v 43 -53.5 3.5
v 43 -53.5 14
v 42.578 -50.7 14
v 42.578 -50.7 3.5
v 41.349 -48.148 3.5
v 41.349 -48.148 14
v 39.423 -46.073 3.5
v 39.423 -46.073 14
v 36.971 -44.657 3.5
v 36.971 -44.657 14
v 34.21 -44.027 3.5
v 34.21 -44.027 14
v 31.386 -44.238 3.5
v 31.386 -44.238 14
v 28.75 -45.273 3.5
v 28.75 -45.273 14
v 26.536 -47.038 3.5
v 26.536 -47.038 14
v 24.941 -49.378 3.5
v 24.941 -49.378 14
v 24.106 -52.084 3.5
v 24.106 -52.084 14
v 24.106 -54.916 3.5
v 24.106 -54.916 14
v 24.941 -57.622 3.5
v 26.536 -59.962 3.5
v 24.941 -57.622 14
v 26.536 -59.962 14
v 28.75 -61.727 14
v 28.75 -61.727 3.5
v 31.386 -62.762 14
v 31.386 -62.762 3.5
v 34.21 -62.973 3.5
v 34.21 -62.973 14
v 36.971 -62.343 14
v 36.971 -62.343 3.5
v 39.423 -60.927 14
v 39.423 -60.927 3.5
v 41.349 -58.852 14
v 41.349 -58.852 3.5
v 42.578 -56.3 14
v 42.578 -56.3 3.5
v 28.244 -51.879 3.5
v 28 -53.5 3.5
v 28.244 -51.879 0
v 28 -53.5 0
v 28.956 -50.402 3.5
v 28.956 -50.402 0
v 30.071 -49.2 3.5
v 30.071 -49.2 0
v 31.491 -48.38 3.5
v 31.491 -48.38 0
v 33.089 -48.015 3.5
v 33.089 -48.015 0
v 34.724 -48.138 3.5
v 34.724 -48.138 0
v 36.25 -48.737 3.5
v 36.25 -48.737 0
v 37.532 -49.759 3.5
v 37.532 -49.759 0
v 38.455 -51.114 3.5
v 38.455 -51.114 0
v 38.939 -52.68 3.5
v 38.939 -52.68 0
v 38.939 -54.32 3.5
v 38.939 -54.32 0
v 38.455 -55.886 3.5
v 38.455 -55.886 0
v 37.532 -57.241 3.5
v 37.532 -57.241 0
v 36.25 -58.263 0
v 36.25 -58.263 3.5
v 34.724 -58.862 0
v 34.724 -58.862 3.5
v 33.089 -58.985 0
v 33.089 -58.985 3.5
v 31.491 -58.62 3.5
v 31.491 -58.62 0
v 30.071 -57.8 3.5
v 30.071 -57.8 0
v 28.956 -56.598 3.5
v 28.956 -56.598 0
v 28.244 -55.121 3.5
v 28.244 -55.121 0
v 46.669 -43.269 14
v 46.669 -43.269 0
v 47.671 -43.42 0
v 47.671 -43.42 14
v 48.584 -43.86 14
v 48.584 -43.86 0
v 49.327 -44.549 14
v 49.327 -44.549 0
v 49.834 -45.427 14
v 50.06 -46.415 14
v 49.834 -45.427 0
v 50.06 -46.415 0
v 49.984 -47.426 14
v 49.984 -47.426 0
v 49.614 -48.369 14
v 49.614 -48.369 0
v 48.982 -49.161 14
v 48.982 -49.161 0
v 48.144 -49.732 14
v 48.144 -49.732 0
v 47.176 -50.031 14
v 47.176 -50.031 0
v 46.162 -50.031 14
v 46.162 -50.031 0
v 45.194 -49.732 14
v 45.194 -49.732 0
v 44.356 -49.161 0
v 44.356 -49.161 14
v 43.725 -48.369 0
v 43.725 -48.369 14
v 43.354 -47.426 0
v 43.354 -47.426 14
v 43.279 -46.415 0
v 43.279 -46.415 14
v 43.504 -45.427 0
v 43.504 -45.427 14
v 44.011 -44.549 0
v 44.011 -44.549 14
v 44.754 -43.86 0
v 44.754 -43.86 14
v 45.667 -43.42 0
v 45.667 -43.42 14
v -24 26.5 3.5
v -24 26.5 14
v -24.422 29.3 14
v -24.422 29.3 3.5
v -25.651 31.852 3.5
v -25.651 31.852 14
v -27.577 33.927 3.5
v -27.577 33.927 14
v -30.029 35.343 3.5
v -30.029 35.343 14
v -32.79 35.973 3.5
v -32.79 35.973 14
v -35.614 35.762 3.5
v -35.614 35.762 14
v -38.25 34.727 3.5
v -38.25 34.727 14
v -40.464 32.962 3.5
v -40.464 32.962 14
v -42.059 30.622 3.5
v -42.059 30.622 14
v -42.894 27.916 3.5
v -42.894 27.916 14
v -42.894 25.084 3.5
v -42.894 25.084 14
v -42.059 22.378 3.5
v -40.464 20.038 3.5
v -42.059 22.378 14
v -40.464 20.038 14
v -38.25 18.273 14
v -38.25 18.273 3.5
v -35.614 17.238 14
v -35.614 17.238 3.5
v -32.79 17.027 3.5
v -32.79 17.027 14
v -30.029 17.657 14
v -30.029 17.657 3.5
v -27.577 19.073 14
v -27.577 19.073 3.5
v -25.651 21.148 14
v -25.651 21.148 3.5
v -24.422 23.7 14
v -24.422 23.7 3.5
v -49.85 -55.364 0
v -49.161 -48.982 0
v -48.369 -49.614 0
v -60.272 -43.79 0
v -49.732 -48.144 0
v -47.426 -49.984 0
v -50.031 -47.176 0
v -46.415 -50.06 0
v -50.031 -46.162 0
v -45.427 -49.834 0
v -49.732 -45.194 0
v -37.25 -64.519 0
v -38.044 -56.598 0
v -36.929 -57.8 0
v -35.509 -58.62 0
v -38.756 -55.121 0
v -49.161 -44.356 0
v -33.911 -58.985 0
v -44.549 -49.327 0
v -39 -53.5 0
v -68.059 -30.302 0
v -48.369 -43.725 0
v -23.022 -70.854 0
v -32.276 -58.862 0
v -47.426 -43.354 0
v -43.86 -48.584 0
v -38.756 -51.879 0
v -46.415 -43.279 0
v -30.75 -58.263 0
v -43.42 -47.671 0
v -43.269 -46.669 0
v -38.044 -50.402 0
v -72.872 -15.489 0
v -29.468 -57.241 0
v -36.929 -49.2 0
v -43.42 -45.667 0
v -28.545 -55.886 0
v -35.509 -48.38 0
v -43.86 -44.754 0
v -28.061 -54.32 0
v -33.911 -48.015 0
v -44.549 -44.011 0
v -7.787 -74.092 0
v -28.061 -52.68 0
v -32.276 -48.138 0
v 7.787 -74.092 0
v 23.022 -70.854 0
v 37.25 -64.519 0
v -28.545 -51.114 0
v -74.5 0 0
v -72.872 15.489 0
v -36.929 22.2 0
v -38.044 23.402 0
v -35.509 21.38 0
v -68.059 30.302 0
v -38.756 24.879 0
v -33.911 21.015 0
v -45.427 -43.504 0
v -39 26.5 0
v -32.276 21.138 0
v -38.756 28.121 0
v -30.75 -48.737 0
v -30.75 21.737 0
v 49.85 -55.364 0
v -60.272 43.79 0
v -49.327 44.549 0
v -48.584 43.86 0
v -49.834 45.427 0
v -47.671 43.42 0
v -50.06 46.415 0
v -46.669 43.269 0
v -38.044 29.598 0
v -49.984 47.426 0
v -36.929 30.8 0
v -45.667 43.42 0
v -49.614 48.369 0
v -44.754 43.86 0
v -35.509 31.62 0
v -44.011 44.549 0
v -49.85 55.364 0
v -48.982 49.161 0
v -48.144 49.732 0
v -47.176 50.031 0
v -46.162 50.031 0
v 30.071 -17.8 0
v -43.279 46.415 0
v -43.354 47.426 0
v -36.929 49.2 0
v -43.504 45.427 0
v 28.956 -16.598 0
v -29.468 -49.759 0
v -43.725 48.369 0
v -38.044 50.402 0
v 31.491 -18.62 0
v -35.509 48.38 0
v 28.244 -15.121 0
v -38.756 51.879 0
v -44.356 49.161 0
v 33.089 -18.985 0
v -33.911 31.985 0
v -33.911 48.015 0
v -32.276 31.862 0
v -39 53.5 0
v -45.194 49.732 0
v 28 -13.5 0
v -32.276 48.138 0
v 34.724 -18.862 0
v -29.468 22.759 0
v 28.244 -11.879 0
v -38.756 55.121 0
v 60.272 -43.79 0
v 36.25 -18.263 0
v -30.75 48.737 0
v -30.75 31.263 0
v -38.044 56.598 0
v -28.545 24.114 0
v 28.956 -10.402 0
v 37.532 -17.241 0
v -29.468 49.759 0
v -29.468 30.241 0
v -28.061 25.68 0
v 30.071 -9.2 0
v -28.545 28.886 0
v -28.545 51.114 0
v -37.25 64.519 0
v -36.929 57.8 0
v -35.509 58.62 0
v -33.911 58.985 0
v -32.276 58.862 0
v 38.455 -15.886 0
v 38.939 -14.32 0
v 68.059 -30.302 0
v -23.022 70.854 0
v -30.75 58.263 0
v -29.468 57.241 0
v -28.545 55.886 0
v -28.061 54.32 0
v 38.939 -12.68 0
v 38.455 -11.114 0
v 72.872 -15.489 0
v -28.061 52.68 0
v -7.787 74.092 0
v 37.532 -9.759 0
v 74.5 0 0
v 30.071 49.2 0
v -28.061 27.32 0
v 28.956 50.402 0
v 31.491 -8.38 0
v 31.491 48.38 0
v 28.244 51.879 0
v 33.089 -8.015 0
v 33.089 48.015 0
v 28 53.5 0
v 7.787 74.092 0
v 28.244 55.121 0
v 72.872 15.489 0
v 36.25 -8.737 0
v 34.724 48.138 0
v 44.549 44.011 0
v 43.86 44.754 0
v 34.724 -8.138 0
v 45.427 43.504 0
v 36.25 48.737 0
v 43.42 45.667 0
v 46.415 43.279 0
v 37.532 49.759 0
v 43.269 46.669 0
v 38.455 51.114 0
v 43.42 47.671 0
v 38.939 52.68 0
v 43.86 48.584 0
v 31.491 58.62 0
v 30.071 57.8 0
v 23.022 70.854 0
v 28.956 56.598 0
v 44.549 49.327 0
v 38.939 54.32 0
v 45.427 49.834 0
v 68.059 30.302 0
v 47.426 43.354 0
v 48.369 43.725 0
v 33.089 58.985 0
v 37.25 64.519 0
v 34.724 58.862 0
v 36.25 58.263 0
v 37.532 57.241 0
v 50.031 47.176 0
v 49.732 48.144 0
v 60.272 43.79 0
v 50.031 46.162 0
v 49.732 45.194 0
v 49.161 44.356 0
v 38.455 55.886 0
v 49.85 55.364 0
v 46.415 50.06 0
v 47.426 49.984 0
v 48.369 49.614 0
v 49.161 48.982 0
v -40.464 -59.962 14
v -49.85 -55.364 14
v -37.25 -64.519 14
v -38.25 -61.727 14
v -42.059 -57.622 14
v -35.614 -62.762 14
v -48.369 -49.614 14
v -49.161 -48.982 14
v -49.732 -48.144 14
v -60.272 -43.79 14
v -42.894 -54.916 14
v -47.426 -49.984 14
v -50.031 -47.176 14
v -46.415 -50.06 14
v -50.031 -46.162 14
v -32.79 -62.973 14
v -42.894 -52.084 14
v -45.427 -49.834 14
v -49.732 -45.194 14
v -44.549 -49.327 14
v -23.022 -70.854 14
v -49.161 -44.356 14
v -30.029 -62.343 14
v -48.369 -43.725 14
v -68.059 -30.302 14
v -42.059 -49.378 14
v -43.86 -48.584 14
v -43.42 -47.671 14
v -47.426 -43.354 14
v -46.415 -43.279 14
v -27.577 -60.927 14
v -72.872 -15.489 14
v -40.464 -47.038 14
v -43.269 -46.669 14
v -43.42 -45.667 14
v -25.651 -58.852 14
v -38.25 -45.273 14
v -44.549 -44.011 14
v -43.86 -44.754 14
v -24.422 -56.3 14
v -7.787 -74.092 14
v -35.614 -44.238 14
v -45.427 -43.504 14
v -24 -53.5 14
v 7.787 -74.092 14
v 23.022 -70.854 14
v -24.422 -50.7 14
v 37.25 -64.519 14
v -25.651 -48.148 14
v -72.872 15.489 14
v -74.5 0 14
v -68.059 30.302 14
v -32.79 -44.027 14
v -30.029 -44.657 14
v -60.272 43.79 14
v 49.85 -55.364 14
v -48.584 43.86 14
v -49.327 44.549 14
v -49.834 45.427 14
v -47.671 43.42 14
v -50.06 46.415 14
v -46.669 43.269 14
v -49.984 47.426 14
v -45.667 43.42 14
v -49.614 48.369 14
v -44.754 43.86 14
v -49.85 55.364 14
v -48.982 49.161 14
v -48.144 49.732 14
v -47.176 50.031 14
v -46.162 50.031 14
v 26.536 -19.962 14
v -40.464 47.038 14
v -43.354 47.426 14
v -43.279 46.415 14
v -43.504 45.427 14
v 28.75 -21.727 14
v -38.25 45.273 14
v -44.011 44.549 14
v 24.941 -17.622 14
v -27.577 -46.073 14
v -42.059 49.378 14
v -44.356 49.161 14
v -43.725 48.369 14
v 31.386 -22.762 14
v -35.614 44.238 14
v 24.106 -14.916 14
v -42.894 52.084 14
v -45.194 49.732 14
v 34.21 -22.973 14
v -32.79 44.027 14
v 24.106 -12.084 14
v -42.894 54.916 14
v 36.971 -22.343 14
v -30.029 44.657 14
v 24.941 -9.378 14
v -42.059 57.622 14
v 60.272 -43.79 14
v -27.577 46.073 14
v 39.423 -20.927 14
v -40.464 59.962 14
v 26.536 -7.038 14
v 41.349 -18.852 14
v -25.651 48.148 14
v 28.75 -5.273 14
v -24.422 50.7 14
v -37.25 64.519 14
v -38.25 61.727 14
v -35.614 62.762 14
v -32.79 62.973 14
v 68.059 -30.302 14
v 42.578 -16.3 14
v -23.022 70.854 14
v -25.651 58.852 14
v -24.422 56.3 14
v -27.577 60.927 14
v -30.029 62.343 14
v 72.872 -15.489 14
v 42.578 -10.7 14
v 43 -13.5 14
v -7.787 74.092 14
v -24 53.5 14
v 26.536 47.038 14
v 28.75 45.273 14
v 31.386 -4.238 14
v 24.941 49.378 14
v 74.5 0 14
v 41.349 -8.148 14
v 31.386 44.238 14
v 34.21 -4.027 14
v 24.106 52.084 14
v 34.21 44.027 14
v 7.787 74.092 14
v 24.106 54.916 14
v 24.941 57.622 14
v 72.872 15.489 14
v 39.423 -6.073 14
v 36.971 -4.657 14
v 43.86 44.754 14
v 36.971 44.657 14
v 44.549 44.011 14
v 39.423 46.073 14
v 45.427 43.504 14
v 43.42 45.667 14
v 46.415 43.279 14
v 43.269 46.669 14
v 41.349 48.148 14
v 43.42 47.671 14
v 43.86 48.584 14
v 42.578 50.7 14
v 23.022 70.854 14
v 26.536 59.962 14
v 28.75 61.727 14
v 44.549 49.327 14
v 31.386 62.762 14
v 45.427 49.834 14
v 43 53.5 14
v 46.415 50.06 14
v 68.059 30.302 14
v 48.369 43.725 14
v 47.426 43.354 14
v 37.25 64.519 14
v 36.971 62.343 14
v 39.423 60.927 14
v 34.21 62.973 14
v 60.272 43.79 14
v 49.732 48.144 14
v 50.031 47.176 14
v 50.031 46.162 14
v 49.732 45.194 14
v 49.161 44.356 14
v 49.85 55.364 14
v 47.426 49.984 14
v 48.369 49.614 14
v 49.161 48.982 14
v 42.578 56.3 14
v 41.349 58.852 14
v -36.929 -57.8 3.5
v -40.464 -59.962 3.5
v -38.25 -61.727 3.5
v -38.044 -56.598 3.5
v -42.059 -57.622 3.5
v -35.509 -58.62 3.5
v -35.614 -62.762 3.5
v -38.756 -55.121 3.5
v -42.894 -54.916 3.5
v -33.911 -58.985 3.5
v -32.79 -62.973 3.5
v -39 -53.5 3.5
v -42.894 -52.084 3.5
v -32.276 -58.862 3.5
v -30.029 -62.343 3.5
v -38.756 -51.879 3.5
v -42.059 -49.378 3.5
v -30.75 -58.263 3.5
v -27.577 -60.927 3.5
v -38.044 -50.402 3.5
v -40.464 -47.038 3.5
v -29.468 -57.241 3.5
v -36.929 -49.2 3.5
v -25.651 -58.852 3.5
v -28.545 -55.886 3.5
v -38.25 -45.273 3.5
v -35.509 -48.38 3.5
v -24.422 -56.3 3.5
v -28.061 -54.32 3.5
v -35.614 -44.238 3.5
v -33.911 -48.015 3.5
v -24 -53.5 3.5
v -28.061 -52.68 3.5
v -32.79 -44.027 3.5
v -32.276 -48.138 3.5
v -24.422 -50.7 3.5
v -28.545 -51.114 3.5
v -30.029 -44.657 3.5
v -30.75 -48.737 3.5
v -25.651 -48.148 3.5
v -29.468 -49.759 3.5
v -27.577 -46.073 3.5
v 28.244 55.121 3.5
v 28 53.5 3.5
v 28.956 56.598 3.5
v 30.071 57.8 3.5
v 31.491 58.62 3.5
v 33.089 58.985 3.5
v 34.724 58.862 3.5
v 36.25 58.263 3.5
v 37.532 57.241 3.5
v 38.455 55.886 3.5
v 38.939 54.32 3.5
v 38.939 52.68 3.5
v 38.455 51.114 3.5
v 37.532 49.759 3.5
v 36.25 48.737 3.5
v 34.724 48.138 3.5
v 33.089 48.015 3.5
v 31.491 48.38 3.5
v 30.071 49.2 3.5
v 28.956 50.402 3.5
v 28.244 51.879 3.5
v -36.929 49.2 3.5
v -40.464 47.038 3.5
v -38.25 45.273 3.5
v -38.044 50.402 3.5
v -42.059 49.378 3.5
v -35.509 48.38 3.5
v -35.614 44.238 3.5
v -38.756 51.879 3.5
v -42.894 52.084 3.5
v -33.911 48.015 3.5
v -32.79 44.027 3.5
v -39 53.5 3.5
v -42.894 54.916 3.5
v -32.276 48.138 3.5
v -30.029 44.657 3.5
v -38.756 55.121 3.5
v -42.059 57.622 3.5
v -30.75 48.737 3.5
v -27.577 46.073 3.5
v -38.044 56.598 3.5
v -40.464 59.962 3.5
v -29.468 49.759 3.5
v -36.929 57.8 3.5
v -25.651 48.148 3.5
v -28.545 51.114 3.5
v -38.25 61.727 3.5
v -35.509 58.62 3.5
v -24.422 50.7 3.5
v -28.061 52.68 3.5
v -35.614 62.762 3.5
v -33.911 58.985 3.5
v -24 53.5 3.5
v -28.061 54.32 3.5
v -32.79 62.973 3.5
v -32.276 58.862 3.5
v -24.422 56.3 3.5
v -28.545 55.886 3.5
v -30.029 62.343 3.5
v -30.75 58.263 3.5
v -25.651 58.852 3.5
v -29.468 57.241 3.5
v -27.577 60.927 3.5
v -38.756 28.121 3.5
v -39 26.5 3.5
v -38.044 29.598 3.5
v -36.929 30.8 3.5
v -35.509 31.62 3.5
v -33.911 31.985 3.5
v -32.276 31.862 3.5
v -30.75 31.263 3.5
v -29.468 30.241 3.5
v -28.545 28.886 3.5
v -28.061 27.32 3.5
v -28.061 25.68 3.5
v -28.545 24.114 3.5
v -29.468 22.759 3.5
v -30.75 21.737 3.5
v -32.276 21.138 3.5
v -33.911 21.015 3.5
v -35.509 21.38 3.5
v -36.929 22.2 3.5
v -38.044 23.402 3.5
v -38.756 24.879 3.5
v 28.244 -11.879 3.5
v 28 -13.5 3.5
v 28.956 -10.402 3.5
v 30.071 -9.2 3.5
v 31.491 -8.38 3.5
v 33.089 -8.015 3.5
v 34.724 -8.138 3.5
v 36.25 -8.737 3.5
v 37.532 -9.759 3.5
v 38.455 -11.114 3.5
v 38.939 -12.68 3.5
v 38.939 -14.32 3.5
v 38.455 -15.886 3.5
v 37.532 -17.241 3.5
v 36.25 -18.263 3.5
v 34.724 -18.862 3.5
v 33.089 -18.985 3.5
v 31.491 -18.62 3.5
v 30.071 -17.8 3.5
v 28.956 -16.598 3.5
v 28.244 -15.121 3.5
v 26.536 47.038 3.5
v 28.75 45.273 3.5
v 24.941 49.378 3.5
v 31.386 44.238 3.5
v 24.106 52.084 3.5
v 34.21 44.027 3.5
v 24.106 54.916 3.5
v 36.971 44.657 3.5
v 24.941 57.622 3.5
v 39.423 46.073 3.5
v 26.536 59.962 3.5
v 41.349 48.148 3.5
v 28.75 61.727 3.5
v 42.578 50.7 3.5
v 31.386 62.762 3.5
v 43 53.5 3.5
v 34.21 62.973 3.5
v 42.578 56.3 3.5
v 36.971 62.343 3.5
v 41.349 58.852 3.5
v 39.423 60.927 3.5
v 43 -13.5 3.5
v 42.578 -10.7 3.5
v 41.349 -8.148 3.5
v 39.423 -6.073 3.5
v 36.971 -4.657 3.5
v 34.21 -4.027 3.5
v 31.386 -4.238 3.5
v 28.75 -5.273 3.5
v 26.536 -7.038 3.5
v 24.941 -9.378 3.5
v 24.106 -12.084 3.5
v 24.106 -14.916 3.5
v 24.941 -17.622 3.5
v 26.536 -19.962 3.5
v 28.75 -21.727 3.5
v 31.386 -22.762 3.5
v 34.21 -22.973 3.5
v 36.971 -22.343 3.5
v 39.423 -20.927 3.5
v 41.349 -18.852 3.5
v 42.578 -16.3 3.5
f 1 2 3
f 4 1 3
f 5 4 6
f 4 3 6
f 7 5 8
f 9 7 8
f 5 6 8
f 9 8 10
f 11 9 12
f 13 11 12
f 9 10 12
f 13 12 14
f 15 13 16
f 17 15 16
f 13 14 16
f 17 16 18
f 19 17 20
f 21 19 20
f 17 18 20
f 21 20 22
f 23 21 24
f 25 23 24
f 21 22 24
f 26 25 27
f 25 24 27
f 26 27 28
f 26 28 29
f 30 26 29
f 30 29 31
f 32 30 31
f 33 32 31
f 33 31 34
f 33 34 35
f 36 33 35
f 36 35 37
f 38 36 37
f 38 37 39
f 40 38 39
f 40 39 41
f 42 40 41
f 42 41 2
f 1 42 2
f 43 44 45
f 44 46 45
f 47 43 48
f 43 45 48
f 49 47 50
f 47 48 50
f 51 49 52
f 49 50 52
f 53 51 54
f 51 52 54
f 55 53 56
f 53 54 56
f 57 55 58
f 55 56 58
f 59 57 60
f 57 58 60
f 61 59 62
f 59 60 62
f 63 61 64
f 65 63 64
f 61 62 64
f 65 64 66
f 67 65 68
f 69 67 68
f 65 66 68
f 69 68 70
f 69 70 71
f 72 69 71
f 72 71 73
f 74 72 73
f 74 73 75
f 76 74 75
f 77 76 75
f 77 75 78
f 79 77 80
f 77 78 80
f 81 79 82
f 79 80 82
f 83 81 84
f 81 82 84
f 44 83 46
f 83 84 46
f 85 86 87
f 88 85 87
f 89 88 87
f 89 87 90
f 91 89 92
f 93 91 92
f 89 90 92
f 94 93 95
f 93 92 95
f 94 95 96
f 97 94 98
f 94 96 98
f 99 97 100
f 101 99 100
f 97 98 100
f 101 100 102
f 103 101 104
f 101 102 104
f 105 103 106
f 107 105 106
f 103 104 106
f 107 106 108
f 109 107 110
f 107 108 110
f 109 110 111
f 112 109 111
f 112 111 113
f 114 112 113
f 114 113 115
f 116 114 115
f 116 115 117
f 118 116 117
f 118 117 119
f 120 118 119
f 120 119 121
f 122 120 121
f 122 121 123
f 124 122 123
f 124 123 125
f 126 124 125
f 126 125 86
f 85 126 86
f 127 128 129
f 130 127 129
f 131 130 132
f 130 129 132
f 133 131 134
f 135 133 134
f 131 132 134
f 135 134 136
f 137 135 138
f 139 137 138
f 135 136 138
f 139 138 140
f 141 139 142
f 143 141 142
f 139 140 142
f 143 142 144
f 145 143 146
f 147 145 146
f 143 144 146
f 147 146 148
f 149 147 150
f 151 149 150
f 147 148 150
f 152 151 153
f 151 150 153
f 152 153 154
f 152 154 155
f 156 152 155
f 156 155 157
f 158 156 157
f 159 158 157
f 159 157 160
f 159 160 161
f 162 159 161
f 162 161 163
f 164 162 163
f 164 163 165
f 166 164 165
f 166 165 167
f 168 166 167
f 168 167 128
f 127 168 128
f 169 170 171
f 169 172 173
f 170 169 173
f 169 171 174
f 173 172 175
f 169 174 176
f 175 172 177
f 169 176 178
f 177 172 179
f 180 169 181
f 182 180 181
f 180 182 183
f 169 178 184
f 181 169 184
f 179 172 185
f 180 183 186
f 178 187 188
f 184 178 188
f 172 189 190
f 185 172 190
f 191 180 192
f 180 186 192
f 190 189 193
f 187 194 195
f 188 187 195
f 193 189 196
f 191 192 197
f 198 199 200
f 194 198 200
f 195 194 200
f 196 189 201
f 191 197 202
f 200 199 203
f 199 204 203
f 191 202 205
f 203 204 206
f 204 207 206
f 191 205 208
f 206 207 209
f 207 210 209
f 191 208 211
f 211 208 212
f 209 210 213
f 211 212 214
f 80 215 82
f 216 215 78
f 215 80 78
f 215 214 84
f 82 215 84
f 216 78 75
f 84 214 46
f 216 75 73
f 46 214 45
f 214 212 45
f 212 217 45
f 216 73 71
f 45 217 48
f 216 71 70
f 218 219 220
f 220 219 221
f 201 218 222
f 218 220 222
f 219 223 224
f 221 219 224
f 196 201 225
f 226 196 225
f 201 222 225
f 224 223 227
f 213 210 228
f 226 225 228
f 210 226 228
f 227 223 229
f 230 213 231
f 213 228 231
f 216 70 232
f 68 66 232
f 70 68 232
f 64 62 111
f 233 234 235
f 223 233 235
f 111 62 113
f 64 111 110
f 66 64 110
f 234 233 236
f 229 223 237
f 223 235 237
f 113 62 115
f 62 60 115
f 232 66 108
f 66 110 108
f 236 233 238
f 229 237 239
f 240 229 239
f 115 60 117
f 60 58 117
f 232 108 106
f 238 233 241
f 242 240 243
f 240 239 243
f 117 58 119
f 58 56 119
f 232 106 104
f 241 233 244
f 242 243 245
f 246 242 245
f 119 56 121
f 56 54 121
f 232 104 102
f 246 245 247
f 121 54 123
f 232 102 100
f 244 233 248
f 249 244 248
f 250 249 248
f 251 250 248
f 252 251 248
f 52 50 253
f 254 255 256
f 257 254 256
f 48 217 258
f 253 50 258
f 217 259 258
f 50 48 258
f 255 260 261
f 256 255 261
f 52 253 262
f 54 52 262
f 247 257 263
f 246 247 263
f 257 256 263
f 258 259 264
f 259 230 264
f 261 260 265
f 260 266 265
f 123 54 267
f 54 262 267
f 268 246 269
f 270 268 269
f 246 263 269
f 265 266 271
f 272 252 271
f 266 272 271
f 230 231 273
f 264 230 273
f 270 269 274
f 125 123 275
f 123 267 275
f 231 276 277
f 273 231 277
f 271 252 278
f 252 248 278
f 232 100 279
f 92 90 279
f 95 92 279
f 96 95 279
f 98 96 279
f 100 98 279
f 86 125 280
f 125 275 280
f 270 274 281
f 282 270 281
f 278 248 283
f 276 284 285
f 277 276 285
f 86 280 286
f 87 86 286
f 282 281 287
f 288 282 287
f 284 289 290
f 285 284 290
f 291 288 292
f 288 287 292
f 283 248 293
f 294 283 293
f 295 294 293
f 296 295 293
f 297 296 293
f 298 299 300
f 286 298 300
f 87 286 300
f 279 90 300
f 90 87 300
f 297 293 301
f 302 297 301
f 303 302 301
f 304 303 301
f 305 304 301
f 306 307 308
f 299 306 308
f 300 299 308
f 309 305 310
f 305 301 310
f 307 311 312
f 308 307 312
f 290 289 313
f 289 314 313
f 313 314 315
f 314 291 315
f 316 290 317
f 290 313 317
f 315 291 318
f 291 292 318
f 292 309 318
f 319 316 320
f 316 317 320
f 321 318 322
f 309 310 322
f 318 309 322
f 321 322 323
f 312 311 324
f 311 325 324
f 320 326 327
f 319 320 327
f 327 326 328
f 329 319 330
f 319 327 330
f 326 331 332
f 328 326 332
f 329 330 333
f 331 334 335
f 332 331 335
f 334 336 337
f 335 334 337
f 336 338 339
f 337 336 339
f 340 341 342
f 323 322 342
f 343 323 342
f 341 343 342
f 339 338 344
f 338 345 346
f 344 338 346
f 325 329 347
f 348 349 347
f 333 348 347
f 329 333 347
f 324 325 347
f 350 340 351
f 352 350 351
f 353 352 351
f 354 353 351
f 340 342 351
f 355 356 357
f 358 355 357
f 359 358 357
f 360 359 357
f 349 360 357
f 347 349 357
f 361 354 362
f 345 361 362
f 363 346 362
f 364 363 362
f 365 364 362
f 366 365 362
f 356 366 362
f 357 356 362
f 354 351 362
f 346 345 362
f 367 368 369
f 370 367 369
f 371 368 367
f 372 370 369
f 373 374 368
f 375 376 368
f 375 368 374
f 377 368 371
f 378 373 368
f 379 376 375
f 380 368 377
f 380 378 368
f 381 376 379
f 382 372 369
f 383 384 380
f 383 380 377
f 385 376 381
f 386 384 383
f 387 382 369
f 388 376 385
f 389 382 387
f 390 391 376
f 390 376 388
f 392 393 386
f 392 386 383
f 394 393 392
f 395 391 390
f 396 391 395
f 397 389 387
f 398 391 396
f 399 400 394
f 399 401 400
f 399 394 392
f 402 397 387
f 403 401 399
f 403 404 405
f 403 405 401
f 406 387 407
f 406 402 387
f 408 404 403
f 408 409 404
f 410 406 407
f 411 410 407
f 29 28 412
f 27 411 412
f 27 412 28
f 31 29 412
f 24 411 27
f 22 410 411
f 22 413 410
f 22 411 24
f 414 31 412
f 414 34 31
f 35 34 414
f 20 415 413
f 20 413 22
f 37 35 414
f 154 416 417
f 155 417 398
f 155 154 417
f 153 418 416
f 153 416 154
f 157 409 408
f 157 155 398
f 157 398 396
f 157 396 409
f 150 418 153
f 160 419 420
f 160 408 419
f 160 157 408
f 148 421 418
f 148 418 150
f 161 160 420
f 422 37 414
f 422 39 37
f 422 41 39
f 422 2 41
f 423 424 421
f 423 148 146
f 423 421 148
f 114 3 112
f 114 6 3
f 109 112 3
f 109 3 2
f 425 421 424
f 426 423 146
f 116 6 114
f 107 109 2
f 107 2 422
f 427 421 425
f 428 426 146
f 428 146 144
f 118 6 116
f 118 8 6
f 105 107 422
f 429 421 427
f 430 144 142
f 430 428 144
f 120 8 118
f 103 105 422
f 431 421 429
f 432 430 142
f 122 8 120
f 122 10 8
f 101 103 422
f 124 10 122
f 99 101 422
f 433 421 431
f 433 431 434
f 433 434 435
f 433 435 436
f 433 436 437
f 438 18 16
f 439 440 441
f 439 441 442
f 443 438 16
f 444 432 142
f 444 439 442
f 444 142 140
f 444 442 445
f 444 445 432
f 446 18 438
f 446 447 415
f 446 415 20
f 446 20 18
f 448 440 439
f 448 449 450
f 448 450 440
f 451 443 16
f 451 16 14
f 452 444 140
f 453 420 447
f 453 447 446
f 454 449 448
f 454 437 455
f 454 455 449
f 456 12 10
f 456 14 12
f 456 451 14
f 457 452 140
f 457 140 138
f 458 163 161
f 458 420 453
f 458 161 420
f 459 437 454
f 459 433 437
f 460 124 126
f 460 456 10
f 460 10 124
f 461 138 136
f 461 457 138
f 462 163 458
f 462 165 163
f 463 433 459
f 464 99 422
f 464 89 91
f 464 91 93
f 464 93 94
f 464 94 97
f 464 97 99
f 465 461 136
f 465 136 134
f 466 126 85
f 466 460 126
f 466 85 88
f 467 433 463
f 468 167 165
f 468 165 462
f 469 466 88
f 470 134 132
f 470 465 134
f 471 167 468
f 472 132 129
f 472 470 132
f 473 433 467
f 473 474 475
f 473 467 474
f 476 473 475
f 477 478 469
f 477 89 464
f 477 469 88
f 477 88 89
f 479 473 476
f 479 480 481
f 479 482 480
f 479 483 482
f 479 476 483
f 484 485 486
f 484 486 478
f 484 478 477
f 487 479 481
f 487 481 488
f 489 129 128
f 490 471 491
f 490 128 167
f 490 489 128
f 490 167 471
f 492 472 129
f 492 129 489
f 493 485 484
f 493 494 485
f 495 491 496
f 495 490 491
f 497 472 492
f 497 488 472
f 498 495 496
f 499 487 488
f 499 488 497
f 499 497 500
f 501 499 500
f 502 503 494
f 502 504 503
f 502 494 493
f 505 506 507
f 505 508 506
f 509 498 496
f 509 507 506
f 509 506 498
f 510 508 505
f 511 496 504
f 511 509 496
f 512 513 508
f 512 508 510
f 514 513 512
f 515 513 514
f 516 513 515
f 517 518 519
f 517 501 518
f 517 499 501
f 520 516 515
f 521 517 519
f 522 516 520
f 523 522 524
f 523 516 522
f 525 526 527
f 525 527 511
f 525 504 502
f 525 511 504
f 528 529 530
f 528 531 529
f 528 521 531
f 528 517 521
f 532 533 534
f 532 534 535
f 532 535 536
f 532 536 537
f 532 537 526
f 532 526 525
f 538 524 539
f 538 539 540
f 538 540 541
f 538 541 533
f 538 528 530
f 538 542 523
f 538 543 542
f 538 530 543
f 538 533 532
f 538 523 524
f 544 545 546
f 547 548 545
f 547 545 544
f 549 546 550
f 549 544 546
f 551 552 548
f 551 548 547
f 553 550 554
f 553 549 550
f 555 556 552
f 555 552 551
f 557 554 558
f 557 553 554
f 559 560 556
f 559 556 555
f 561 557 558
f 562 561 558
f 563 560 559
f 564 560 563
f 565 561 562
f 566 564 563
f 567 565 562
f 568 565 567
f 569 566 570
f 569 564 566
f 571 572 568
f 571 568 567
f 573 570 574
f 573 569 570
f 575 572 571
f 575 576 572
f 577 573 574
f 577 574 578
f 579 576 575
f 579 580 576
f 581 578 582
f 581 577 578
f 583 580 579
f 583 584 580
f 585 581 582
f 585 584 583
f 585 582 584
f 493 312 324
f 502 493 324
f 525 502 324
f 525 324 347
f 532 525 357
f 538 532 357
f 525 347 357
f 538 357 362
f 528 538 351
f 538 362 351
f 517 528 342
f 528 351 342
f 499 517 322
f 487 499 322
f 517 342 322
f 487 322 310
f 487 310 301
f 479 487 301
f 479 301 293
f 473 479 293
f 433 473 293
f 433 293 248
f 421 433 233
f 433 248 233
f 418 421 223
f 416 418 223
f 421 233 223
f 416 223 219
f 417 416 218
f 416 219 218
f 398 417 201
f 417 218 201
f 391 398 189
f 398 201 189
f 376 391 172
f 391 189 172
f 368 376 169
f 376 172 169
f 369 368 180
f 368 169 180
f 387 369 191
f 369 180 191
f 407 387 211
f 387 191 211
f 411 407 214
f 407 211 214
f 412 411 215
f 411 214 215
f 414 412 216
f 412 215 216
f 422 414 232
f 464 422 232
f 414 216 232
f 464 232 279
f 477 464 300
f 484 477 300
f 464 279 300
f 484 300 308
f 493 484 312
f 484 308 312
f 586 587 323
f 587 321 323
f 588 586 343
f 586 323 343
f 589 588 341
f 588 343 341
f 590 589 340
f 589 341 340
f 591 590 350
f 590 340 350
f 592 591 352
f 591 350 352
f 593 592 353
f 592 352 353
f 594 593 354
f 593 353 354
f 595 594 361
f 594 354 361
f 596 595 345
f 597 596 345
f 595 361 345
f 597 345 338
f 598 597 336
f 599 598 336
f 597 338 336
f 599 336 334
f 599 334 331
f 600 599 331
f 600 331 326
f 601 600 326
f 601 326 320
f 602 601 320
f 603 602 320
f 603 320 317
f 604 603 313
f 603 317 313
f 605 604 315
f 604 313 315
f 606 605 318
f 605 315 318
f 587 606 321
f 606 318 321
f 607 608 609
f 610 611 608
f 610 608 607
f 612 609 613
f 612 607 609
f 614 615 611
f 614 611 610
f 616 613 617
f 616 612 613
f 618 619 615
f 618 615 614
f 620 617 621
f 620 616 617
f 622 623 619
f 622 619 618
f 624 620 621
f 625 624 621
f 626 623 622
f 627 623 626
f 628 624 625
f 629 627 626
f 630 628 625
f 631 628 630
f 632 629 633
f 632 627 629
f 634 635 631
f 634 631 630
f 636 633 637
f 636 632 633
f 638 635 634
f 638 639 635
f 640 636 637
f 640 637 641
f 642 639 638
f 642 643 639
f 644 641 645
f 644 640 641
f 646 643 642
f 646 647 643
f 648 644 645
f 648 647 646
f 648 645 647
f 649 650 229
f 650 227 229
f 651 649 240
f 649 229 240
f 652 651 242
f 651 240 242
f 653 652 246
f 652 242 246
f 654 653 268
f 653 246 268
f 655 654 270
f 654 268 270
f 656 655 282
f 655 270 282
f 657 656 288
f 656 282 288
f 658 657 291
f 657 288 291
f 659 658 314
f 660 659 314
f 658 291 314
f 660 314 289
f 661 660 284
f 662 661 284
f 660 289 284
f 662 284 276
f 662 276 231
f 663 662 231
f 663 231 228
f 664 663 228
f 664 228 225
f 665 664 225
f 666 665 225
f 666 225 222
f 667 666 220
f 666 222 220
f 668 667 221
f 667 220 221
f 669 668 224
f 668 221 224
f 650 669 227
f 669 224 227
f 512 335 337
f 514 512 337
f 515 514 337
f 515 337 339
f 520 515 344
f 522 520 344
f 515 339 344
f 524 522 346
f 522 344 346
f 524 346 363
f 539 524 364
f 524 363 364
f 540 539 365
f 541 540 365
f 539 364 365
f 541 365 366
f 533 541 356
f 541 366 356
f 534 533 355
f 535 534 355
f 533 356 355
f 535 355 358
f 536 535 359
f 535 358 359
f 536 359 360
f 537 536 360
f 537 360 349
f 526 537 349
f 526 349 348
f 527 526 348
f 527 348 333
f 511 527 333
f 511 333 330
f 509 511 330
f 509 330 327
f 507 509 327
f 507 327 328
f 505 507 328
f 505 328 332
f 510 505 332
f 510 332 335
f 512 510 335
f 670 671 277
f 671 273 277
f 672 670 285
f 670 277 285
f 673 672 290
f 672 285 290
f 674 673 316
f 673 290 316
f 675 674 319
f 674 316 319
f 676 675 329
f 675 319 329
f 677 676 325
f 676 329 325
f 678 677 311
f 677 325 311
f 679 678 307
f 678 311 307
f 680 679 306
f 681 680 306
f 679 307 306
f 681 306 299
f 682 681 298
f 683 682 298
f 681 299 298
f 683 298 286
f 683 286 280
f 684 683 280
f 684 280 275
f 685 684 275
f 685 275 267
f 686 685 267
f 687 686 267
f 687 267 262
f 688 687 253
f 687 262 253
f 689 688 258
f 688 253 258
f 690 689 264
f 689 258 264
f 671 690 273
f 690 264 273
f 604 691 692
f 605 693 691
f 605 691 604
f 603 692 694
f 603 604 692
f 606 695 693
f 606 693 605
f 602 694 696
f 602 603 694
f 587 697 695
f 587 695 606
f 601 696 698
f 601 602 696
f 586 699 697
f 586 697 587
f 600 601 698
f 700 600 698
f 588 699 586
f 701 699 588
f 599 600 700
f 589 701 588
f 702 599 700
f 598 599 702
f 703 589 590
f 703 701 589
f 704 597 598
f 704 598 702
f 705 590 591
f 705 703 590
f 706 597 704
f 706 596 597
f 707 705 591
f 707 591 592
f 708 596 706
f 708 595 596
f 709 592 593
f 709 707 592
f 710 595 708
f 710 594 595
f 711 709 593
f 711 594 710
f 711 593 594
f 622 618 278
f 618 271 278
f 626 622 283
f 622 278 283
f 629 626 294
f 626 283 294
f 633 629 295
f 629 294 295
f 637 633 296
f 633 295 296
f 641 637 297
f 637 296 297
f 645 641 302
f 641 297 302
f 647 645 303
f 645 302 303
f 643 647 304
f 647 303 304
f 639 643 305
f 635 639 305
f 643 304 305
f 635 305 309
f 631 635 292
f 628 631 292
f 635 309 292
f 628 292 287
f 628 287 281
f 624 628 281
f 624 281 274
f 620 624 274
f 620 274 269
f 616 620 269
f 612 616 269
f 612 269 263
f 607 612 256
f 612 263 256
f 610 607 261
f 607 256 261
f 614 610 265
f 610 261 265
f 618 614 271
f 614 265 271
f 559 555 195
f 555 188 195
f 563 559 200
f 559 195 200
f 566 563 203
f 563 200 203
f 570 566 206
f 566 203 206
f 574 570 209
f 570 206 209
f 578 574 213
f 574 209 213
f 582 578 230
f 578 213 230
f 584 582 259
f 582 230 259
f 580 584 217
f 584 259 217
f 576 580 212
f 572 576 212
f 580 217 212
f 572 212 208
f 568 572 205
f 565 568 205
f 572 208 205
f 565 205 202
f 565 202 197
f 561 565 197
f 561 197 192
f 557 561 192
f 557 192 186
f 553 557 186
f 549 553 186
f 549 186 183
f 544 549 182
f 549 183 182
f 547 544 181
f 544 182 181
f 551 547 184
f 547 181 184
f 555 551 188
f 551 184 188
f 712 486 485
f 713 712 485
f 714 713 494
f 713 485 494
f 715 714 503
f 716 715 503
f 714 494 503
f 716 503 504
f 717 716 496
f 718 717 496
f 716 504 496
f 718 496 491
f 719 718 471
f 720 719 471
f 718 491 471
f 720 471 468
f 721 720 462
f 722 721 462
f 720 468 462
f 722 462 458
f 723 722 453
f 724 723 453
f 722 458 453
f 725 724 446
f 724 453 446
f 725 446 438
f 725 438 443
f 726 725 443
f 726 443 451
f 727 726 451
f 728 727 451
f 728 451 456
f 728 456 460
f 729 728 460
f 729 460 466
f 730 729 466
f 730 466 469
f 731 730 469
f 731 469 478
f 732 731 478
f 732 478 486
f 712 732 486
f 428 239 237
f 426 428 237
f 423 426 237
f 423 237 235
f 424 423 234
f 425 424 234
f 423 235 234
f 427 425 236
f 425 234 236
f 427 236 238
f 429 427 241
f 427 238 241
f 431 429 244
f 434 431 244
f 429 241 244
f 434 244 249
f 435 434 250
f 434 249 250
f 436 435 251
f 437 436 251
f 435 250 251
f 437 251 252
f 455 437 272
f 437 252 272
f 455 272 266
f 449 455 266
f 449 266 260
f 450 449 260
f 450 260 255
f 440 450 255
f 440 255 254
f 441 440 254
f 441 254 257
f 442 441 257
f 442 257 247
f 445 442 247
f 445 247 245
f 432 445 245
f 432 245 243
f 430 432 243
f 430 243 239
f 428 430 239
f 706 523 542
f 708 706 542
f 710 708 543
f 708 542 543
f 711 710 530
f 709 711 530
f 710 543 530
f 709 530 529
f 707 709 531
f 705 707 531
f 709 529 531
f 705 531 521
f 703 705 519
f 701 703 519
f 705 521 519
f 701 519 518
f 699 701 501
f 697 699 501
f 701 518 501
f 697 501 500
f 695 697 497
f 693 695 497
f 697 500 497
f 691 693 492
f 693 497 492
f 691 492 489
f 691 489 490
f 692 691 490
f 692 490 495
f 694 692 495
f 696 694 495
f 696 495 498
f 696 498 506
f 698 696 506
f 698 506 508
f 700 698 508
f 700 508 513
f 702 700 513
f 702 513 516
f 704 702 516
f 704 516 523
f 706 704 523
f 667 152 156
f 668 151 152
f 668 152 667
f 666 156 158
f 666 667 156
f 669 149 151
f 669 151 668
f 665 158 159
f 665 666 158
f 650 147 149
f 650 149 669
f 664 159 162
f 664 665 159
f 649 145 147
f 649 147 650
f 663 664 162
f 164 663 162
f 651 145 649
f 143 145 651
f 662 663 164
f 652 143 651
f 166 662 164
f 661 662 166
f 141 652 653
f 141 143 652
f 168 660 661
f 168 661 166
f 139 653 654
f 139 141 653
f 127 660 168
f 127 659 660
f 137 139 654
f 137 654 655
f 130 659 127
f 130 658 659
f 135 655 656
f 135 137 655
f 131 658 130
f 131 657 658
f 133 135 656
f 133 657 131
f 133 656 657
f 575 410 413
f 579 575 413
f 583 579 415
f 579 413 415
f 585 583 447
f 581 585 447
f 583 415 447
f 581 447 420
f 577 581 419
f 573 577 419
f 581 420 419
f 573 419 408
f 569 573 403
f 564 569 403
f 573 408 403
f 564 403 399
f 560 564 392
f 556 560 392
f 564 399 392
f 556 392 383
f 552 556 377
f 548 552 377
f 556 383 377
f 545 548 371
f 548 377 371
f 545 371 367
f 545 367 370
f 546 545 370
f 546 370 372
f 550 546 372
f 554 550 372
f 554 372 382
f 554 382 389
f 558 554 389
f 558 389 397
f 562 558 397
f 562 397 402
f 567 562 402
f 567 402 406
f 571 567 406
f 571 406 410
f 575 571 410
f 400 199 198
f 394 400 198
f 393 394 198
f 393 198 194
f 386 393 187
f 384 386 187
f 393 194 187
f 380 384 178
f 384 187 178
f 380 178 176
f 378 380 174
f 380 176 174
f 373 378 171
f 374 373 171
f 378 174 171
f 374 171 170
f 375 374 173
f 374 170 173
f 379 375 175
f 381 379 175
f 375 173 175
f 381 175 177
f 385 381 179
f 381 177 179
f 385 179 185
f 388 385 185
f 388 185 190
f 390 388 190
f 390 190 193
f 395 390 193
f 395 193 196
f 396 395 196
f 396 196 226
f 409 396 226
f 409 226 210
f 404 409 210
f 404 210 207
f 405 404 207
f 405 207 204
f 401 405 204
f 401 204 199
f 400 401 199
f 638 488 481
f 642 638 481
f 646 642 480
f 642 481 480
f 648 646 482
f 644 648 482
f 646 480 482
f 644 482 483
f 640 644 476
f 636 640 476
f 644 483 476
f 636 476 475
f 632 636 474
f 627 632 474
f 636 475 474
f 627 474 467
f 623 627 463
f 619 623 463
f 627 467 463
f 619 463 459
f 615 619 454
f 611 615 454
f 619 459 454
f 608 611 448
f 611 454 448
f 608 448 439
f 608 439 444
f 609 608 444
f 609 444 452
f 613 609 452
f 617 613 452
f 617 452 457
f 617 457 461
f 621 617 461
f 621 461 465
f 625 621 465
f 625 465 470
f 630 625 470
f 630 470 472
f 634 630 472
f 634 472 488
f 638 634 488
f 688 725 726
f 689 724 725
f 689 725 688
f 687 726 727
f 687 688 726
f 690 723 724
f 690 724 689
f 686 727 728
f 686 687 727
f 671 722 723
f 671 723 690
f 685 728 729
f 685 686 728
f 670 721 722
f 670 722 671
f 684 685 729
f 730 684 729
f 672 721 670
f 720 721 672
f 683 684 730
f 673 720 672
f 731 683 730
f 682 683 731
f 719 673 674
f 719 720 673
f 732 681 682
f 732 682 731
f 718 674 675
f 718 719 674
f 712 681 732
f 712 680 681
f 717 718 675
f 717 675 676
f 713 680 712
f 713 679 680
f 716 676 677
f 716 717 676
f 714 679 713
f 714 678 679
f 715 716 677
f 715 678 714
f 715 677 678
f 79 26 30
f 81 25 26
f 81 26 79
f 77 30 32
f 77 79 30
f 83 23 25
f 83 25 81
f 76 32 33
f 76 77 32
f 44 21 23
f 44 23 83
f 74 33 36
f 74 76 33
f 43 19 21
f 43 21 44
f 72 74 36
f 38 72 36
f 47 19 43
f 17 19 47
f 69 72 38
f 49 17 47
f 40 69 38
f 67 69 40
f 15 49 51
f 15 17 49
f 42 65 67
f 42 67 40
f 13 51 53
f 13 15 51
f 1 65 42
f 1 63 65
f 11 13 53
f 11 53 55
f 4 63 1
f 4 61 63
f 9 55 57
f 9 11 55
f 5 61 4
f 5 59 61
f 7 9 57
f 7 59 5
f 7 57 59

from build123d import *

# Parameters (mm, degrees)
SKETCH_1_R                    = 74.5
EXTRUDE_1_DEPTH               = 14
HOLE_WIZARD_M10_1_D           = 11
HOLE_WIZARD_M10_1_CBORE_D     = 19
HOLE_WIZARD_M10_1_CBORE_DEPTH = 10.5
HOLE_WIZARD_M8_1_D            = 6.8
PATTERN_CIRCULAR_1_COUNT      = 4


with BuildPart() as part:
    # 草图1 → 凸台-拉伸1 (new body)
    with BuildSketch(Plane.XY):
        Circle(SKETCH_1_R)
    extrude(amount=EXTRUDE_1_DEPTH)

    # M10 六角头螺栓的柱形沉头孔1 (through all)
    with Locations(Plane.XY.offset(14)):
        with Locations((-33.5, 26.5), (-33.5, -53.5), (33.5, -53.5), (33.5, -13.5), (33.5, 53.5), (-33.5, 53.5)):
            CounterBoreHole(HOLE_WIZARD_M10_1_D / 2, HOLE_WIZARD_M10_1_CBORE_D / 2, HOLE_WIZARD_M10_1_CBORE_DEPTH)

    # M8 螺纹孔的螺纹孔钻头1 (through all)
    with Locations(Plane.XY.offset(14)):
        with Locations((46.669047558, 46.669047558)):
            hole_wizard_m8_1 = Hole(HOLE_WIZARD_M8_1_D / 2)

    # 阵列(圆周)1: M8 螺纹孔的螺纹孔钻头1 ×4 about axis
    pattern_circular_1_axis = Axis((0, 0, 0), (0, 0, 1))
    for i in range(1, PATTERN_CIRCULAR_1_COUNT):
        add(hole_wizard_m8_1.rotate(pattern_circular_1_axis, i * 360 / PATTERN_CIRCULAR_1_COUNT), mode=Mode.SUBTRACT)


solid = part.part
